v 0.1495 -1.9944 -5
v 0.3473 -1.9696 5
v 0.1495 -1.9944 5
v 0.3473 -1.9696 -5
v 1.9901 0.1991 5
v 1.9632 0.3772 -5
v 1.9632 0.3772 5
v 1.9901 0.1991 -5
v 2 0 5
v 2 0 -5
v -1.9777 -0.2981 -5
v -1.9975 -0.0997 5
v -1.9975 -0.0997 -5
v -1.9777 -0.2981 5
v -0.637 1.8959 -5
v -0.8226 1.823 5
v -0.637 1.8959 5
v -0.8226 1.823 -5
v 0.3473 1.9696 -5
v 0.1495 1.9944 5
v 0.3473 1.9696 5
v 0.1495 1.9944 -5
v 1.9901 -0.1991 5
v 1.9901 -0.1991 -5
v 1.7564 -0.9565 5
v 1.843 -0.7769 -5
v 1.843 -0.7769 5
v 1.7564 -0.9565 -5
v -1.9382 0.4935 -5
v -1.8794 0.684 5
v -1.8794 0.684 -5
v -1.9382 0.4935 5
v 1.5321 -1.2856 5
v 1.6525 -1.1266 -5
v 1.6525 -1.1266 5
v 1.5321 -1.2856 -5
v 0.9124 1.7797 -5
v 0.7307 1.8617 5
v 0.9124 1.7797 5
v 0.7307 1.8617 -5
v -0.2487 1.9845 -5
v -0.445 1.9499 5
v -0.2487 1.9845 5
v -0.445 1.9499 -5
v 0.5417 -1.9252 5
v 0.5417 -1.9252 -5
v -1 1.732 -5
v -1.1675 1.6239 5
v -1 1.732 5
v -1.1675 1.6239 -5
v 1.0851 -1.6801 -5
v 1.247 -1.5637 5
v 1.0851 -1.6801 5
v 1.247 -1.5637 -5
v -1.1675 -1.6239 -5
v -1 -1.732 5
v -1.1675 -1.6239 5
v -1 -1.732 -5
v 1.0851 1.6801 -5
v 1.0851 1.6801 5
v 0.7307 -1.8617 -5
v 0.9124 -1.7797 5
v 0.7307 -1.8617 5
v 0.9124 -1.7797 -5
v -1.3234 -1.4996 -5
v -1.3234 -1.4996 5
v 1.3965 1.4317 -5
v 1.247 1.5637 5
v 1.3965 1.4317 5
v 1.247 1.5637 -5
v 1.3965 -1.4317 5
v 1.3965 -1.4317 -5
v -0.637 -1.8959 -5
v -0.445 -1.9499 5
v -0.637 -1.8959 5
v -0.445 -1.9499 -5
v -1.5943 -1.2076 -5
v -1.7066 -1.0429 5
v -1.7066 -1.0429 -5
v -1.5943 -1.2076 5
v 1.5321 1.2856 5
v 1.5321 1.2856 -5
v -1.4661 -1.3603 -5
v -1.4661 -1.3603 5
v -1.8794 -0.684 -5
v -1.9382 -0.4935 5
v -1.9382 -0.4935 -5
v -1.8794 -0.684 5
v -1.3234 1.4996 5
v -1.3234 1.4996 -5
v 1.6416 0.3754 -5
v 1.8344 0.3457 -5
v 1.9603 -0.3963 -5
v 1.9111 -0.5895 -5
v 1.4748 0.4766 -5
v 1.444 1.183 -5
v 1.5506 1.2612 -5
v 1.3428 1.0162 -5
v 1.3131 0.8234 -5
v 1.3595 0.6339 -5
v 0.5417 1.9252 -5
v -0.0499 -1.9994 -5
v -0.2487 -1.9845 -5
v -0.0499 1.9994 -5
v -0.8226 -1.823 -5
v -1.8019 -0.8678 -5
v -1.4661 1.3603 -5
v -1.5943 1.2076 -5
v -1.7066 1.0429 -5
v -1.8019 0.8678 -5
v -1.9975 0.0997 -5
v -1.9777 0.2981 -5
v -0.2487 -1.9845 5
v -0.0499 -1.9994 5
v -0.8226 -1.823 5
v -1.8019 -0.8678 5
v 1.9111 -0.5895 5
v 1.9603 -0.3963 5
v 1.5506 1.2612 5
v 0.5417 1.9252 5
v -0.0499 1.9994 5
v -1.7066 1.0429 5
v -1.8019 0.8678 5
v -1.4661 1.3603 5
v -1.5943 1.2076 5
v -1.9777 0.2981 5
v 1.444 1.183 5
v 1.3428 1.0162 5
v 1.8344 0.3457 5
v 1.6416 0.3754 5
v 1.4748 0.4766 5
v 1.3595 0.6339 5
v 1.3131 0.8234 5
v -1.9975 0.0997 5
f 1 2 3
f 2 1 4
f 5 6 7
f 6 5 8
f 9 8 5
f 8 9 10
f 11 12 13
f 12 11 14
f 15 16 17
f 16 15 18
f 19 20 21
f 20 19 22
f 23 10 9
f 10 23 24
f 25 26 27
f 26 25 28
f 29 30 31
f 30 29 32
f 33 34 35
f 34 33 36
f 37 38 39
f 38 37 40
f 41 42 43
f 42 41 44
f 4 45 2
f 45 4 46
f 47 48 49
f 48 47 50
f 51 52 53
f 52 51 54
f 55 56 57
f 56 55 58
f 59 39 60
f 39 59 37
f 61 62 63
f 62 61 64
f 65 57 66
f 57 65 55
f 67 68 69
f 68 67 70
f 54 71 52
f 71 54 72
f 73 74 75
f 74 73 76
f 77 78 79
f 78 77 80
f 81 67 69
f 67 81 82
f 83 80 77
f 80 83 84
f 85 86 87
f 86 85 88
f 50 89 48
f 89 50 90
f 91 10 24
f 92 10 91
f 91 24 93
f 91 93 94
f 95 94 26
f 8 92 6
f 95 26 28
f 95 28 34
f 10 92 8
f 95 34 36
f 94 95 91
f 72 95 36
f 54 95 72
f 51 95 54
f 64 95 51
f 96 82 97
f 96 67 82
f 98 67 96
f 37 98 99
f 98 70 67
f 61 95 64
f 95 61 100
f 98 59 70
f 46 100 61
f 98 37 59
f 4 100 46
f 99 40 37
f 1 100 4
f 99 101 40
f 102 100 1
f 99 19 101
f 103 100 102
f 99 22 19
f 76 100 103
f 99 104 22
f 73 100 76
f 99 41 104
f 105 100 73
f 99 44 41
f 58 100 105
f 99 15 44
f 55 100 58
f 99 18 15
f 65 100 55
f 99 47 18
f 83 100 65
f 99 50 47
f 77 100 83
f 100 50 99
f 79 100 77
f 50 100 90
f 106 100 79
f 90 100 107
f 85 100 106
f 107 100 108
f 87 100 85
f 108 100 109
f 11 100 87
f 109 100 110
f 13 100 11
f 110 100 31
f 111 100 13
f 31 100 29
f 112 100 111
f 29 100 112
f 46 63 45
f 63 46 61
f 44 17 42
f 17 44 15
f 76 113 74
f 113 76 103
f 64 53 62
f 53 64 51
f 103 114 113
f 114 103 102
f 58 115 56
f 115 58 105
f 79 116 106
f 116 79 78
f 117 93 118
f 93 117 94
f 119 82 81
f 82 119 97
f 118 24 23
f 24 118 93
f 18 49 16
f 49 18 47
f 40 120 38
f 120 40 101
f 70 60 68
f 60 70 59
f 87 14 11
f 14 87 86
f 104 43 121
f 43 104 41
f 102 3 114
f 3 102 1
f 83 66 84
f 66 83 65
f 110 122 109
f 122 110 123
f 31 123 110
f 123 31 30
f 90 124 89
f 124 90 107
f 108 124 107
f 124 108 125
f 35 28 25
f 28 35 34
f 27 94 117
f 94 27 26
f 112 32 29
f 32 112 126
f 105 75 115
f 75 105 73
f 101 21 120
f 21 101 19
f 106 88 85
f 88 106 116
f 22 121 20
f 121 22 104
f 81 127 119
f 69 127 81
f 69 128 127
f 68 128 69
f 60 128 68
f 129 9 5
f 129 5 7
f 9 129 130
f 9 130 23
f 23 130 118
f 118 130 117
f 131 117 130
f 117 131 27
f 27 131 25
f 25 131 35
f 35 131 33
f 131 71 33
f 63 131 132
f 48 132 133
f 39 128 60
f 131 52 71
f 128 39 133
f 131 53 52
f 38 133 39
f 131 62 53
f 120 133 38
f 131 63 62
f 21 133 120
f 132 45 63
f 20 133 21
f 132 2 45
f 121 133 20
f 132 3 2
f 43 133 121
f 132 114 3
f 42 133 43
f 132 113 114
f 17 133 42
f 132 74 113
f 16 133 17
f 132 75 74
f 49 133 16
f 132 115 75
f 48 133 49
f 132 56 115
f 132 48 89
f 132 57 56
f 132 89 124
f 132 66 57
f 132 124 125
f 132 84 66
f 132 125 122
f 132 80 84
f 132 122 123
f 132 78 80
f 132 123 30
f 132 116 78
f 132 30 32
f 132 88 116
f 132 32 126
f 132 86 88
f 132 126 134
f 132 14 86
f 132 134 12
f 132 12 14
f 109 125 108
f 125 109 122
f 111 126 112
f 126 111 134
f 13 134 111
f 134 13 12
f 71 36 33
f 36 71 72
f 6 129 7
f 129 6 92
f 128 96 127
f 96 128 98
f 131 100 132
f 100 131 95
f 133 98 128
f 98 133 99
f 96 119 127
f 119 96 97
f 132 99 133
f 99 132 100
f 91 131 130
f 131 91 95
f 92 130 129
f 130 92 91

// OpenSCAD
$fa = 1;
$fs = 0.2;


difference(){
cylinder(h=10, r= 2, center = true);
rotate([0, 0, 25])
translate([2, 0, 0])
cylinder(h=15, r = 0.5, center = true);
}    
